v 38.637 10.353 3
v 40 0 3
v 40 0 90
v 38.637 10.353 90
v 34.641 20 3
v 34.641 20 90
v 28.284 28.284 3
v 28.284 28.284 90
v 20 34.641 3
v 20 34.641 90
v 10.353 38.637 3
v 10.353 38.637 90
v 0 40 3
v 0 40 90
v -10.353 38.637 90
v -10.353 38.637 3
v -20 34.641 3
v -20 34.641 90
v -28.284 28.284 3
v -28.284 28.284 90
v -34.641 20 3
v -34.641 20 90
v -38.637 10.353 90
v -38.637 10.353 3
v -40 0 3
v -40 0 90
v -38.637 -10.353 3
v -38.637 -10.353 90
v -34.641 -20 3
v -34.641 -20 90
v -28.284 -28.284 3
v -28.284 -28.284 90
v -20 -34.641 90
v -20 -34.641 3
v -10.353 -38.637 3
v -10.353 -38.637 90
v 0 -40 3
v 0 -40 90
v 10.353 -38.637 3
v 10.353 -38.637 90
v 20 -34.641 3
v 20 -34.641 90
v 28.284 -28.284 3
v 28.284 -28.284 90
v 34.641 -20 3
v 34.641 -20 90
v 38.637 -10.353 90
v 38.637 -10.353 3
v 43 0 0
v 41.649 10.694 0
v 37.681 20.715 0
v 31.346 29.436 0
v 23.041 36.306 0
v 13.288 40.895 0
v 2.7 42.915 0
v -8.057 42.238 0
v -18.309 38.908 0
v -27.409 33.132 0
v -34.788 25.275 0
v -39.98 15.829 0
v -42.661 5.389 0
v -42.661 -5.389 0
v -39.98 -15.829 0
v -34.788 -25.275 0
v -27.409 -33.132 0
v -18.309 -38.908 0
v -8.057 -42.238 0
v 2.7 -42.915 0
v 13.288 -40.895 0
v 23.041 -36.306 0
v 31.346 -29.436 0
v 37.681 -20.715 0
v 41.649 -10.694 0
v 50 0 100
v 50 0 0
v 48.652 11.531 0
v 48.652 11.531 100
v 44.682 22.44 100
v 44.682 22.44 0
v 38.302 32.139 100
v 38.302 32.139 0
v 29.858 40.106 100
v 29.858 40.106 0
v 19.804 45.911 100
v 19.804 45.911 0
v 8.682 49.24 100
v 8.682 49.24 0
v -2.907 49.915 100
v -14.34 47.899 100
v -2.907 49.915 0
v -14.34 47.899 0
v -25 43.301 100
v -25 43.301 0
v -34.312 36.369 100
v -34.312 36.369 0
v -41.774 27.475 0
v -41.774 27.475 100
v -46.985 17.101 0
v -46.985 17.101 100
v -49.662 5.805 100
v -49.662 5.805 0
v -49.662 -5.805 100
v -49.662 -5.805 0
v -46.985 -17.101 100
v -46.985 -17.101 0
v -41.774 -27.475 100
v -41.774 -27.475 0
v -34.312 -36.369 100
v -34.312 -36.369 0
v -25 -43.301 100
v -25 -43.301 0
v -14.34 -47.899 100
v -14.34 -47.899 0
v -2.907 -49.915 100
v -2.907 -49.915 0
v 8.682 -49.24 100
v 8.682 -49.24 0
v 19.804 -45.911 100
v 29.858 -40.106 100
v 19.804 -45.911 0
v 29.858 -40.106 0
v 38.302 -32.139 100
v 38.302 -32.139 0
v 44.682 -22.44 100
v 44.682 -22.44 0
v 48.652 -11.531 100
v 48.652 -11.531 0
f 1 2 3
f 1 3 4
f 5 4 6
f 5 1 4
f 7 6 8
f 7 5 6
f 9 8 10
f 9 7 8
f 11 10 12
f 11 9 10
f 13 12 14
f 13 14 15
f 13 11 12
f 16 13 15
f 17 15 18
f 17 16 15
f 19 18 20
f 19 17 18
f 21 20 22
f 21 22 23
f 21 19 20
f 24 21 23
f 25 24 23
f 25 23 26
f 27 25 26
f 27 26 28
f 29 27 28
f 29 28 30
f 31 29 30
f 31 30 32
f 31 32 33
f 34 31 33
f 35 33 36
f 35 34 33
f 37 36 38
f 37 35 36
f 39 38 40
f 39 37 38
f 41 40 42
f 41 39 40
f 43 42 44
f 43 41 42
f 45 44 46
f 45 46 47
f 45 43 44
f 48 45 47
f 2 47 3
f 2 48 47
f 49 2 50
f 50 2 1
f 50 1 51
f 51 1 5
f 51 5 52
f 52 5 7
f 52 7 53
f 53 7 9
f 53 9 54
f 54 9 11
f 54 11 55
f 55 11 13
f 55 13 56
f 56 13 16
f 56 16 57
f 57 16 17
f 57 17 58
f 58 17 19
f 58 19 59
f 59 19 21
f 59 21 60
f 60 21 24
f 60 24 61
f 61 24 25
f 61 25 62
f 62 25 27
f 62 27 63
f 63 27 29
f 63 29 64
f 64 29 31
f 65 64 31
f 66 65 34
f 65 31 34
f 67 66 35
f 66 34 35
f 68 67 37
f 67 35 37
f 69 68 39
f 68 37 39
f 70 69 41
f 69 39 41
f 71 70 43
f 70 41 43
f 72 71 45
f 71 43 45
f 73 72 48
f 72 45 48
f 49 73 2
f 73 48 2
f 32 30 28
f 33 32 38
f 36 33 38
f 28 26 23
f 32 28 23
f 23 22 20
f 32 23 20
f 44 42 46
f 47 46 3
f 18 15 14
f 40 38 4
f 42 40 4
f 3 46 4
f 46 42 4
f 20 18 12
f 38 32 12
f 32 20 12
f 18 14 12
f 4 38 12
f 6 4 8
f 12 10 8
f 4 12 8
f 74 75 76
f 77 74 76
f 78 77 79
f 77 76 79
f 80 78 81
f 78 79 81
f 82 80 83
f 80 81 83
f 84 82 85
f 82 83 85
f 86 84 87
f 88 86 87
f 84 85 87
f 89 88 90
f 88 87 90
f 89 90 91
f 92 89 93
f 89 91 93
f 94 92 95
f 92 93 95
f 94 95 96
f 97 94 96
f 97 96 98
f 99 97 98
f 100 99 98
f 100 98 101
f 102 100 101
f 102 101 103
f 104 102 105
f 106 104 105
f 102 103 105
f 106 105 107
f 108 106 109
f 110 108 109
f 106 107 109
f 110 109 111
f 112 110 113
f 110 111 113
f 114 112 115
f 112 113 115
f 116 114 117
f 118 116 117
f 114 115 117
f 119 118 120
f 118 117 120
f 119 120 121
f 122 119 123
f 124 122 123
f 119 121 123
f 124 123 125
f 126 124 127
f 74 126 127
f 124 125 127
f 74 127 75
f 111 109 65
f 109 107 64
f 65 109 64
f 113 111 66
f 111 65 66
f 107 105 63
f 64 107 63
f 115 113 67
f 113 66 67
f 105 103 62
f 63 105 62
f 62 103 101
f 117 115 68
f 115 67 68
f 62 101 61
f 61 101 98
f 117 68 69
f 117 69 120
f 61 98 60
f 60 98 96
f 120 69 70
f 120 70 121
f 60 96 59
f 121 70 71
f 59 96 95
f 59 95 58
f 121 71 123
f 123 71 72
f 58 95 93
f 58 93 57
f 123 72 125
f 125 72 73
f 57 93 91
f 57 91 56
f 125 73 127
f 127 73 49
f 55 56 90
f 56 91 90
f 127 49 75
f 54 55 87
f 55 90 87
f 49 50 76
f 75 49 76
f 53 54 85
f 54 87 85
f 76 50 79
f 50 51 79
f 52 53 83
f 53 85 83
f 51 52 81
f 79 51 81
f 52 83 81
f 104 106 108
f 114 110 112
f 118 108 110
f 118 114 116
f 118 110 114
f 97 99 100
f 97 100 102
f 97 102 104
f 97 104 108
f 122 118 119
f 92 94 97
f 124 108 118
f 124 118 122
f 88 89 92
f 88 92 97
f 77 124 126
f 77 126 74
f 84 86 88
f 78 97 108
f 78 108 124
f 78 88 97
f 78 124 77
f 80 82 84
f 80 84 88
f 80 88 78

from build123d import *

# Parameters (mm, degrees)
SKETCH001_R  = 40
PAD001_DEPTH = 90
SKETCH_R     = 50
PAD_DEPTH    = 100
CHAMFER_SIZE = 3


with BuildPart() as body001:
    # Sketch001 → Pad001 (new body)
    with BuildSketch(Plane.XY):
        Circle(SKETCH001_R)
    extrude(amount=PAD001_DEPTH)


with BuildPart() as chamfer_body:
    # Sketch → Pad (new body)
    with BuildSketch(Plane.XY):
        Circle(SKETCH_R)
    extrude(amount=PAD_DEPTH)

    # Cut: cut Body001
    add(body001.part, mode=Mode.SUBTRACT)

    # Chamfer
    chamfer_edges = [chamfer_body.edges().sort_by_distance(p)[0] for p in [
        (-40, 0, 0),
    ]]
    chamfer(chamfer_edges, length=CHAMFER_SIZE)


solid = chamfer_body.part
